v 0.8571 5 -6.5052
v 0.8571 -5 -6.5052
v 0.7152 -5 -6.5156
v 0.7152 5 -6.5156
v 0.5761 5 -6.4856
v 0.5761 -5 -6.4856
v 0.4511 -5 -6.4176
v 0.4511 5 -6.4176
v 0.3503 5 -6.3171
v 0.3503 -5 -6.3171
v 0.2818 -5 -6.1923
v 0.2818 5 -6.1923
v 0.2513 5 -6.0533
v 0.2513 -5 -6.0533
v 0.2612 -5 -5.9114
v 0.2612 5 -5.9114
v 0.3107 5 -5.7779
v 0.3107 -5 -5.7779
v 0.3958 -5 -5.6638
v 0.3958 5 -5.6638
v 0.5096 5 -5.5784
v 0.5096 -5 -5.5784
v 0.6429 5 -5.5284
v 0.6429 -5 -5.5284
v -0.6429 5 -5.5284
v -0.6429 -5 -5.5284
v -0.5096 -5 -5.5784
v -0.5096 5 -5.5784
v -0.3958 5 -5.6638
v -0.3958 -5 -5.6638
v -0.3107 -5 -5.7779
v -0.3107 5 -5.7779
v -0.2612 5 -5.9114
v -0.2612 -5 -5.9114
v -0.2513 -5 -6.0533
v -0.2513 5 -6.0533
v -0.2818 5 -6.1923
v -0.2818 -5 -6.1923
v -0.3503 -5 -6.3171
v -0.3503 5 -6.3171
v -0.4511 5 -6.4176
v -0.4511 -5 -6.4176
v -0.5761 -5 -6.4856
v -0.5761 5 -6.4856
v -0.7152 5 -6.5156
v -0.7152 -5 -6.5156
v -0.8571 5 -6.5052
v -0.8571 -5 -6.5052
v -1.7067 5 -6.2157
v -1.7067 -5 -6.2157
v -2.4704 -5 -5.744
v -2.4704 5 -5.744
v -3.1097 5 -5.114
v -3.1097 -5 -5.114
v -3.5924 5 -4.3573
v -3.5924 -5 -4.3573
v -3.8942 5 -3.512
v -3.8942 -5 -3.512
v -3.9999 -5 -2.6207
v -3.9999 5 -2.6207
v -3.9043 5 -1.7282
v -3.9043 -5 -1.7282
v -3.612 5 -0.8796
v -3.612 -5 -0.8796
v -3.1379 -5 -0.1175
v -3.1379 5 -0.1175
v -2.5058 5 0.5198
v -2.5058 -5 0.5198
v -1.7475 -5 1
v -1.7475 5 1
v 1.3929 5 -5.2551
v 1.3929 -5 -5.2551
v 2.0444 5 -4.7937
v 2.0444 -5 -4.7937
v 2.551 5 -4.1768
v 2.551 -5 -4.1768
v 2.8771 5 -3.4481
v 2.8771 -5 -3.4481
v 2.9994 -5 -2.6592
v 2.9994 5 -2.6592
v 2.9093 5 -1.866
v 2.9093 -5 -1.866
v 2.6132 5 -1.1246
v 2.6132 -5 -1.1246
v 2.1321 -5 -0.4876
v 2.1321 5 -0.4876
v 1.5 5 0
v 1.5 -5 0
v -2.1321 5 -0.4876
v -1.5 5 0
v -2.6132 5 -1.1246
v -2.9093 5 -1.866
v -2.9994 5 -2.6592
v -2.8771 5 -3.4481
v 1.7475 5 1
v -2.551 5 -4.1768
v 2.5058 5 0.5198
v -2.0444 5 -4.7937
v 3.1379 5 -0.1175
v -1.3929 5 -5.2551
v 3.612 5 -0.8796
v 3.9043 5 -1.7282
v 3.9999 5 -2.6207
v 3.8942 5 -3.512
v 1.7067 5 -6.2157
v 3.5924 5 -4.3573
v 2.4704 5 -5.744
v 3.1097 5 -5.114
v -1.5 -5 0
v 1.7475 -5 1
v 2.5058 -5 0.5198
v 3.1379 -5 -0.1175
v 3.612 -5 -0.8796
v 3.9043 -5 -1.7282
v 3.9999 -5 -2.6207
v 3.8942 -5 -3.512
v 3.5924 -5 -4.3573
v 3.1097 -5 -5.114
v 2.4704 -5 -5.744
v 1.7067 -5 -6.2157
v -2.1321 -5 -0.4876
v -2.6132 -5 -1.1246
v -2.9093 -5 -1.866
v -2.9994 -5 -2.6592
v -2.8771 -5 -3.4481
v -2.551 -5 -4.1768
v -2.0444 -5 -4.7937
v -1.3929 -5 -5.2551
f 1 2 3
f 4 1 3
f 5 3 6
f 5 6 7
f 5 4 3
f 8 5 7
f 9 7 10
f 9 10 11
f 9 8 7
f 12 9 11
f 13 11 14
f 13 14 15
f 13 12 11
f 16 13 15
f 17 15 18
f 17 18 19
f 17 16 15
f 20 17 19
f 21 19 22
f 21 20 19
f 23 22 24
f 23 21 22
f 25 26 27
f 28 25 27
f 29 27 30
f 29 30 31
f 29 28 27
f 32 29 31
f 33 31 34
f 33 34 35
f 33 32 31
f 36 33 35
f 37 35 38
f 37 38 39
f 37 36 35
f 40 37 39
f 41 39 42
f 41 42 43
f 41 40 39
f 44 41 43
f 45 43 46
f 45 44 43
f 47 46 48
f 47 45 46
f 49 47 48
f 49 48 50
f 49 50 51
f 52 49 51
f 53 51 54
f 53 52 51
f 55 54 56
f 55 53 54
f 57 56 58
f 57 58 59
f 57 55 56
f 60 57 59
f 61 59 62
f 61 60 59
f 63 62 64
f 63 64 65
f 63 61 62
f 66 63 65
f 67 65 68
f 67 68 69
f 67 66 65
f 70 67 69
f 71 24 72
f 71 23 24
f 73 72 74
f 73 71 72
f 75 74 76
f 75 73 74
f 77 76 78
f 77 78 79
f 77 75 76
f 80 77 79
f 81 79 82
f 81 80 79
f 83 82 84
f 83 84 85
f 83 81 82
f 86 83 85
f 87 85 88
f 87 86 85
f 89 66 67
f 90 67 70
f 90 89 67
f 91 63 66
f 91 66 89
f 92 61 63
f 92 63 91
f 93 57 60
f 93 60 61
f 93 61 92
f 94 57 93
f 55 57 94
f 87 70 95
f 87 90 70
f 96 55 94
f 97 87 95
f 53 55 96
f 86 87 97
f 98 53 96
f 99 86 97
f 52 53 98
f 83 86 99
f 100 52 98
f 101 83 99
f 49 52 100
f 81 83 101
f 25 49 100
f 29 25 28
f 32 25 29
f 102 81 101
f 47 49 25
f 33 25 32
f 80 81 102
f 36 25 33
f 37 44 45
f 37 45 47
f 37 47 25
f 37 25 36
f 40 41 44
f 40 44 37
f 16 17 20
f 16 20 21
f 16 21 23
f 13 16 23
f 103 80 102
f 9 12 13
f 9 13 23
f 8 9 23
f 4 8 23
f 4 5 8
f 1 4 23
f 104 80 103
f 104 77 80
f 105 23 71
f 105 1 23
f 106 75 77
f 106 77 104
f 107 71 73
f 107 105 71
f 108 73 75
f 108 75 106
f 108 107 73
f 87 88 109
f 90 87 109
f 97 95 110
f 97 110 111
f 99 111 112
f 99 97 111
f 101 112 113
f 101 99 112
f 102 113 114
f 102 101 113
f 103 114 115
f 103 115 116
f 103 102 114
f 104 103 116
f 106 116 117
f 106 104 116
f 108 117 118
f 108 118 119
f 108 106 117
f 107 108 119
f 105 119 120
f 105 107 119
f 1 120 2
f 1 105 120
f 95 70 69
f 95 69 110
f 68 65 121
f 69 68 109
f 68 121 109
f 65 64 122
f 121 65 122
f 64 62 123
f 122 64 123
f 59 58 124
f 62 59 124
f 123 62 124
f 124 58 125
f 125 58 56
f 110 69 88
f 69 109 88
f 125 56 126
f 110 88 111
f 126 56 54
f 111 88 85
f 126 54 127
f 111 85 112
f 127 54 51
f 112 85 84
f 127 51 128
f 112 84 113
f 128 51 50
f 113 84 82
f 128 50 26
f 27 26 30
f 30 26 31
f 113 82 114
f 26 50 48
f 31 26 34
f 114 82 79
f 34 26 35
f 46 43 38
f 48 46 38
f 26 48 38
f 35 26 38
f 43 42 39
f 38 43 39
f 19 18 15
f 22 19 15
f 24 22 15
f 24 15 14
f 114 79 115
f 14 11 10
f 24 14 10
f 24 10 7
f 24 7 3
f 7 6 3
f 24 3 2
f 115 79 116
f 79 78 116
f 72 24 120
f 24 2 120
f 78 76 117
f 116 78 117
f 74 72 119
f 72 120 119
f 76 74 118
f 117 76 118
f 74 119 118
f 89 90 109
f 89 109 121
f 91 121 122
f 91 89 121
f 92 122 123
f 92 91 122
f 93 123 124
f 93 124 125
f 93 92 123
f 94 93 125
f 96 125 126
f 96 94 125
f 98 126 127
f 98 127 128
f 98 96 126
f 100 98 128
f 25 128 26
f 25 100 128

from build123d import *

# Parameters (mm, degrees)
BOSS_EXTRUDE1_DEPTH = 5


with BuildPart() as part:
    # Sketch1 → Boss-Extrude1 (new, symmetric)
    with BuildSketch(Plane(origin=(0, 0, 0), x_dir=(1, 0, 0), z_dir=(0, 1, 0))):
        with BuildLine():
            Line((1.5, 0), (-1.5, 0))
            ThreePointArc((-1.5, 0), (-2.96457943, 3.057716073), (-0.642857143, 5.528389282))
            ThreePointArc((-0.642857143, 5.528389282), (-0.261614488, 6.123917651), (-0.857142857, 6.505160306))
            ThreePointArc((-0.857142857, 6.505160306), (-3.972144627, 3.069316131), (-1.747526131, -1))
            Line((-1.747526131, -1), (1.747526131, -1))
            ThreePointArc((1.747526131, -1), (3.972144627, 3.069316131), (0.857142857, 6.505160306))
            ThreePointArc((0.857142857, 6.505160306), (0.261614488, 6.123917651), (0.642857143, 5.528389282))
            ThreePointArc((0.642857143, 5.528389282), (2.96457943, 3.057716073), (1.5, 0))
        make_face()
    extrude(amount=BOSS_EXTRUDE1_DEPTH, both=True)


solid = part.part
